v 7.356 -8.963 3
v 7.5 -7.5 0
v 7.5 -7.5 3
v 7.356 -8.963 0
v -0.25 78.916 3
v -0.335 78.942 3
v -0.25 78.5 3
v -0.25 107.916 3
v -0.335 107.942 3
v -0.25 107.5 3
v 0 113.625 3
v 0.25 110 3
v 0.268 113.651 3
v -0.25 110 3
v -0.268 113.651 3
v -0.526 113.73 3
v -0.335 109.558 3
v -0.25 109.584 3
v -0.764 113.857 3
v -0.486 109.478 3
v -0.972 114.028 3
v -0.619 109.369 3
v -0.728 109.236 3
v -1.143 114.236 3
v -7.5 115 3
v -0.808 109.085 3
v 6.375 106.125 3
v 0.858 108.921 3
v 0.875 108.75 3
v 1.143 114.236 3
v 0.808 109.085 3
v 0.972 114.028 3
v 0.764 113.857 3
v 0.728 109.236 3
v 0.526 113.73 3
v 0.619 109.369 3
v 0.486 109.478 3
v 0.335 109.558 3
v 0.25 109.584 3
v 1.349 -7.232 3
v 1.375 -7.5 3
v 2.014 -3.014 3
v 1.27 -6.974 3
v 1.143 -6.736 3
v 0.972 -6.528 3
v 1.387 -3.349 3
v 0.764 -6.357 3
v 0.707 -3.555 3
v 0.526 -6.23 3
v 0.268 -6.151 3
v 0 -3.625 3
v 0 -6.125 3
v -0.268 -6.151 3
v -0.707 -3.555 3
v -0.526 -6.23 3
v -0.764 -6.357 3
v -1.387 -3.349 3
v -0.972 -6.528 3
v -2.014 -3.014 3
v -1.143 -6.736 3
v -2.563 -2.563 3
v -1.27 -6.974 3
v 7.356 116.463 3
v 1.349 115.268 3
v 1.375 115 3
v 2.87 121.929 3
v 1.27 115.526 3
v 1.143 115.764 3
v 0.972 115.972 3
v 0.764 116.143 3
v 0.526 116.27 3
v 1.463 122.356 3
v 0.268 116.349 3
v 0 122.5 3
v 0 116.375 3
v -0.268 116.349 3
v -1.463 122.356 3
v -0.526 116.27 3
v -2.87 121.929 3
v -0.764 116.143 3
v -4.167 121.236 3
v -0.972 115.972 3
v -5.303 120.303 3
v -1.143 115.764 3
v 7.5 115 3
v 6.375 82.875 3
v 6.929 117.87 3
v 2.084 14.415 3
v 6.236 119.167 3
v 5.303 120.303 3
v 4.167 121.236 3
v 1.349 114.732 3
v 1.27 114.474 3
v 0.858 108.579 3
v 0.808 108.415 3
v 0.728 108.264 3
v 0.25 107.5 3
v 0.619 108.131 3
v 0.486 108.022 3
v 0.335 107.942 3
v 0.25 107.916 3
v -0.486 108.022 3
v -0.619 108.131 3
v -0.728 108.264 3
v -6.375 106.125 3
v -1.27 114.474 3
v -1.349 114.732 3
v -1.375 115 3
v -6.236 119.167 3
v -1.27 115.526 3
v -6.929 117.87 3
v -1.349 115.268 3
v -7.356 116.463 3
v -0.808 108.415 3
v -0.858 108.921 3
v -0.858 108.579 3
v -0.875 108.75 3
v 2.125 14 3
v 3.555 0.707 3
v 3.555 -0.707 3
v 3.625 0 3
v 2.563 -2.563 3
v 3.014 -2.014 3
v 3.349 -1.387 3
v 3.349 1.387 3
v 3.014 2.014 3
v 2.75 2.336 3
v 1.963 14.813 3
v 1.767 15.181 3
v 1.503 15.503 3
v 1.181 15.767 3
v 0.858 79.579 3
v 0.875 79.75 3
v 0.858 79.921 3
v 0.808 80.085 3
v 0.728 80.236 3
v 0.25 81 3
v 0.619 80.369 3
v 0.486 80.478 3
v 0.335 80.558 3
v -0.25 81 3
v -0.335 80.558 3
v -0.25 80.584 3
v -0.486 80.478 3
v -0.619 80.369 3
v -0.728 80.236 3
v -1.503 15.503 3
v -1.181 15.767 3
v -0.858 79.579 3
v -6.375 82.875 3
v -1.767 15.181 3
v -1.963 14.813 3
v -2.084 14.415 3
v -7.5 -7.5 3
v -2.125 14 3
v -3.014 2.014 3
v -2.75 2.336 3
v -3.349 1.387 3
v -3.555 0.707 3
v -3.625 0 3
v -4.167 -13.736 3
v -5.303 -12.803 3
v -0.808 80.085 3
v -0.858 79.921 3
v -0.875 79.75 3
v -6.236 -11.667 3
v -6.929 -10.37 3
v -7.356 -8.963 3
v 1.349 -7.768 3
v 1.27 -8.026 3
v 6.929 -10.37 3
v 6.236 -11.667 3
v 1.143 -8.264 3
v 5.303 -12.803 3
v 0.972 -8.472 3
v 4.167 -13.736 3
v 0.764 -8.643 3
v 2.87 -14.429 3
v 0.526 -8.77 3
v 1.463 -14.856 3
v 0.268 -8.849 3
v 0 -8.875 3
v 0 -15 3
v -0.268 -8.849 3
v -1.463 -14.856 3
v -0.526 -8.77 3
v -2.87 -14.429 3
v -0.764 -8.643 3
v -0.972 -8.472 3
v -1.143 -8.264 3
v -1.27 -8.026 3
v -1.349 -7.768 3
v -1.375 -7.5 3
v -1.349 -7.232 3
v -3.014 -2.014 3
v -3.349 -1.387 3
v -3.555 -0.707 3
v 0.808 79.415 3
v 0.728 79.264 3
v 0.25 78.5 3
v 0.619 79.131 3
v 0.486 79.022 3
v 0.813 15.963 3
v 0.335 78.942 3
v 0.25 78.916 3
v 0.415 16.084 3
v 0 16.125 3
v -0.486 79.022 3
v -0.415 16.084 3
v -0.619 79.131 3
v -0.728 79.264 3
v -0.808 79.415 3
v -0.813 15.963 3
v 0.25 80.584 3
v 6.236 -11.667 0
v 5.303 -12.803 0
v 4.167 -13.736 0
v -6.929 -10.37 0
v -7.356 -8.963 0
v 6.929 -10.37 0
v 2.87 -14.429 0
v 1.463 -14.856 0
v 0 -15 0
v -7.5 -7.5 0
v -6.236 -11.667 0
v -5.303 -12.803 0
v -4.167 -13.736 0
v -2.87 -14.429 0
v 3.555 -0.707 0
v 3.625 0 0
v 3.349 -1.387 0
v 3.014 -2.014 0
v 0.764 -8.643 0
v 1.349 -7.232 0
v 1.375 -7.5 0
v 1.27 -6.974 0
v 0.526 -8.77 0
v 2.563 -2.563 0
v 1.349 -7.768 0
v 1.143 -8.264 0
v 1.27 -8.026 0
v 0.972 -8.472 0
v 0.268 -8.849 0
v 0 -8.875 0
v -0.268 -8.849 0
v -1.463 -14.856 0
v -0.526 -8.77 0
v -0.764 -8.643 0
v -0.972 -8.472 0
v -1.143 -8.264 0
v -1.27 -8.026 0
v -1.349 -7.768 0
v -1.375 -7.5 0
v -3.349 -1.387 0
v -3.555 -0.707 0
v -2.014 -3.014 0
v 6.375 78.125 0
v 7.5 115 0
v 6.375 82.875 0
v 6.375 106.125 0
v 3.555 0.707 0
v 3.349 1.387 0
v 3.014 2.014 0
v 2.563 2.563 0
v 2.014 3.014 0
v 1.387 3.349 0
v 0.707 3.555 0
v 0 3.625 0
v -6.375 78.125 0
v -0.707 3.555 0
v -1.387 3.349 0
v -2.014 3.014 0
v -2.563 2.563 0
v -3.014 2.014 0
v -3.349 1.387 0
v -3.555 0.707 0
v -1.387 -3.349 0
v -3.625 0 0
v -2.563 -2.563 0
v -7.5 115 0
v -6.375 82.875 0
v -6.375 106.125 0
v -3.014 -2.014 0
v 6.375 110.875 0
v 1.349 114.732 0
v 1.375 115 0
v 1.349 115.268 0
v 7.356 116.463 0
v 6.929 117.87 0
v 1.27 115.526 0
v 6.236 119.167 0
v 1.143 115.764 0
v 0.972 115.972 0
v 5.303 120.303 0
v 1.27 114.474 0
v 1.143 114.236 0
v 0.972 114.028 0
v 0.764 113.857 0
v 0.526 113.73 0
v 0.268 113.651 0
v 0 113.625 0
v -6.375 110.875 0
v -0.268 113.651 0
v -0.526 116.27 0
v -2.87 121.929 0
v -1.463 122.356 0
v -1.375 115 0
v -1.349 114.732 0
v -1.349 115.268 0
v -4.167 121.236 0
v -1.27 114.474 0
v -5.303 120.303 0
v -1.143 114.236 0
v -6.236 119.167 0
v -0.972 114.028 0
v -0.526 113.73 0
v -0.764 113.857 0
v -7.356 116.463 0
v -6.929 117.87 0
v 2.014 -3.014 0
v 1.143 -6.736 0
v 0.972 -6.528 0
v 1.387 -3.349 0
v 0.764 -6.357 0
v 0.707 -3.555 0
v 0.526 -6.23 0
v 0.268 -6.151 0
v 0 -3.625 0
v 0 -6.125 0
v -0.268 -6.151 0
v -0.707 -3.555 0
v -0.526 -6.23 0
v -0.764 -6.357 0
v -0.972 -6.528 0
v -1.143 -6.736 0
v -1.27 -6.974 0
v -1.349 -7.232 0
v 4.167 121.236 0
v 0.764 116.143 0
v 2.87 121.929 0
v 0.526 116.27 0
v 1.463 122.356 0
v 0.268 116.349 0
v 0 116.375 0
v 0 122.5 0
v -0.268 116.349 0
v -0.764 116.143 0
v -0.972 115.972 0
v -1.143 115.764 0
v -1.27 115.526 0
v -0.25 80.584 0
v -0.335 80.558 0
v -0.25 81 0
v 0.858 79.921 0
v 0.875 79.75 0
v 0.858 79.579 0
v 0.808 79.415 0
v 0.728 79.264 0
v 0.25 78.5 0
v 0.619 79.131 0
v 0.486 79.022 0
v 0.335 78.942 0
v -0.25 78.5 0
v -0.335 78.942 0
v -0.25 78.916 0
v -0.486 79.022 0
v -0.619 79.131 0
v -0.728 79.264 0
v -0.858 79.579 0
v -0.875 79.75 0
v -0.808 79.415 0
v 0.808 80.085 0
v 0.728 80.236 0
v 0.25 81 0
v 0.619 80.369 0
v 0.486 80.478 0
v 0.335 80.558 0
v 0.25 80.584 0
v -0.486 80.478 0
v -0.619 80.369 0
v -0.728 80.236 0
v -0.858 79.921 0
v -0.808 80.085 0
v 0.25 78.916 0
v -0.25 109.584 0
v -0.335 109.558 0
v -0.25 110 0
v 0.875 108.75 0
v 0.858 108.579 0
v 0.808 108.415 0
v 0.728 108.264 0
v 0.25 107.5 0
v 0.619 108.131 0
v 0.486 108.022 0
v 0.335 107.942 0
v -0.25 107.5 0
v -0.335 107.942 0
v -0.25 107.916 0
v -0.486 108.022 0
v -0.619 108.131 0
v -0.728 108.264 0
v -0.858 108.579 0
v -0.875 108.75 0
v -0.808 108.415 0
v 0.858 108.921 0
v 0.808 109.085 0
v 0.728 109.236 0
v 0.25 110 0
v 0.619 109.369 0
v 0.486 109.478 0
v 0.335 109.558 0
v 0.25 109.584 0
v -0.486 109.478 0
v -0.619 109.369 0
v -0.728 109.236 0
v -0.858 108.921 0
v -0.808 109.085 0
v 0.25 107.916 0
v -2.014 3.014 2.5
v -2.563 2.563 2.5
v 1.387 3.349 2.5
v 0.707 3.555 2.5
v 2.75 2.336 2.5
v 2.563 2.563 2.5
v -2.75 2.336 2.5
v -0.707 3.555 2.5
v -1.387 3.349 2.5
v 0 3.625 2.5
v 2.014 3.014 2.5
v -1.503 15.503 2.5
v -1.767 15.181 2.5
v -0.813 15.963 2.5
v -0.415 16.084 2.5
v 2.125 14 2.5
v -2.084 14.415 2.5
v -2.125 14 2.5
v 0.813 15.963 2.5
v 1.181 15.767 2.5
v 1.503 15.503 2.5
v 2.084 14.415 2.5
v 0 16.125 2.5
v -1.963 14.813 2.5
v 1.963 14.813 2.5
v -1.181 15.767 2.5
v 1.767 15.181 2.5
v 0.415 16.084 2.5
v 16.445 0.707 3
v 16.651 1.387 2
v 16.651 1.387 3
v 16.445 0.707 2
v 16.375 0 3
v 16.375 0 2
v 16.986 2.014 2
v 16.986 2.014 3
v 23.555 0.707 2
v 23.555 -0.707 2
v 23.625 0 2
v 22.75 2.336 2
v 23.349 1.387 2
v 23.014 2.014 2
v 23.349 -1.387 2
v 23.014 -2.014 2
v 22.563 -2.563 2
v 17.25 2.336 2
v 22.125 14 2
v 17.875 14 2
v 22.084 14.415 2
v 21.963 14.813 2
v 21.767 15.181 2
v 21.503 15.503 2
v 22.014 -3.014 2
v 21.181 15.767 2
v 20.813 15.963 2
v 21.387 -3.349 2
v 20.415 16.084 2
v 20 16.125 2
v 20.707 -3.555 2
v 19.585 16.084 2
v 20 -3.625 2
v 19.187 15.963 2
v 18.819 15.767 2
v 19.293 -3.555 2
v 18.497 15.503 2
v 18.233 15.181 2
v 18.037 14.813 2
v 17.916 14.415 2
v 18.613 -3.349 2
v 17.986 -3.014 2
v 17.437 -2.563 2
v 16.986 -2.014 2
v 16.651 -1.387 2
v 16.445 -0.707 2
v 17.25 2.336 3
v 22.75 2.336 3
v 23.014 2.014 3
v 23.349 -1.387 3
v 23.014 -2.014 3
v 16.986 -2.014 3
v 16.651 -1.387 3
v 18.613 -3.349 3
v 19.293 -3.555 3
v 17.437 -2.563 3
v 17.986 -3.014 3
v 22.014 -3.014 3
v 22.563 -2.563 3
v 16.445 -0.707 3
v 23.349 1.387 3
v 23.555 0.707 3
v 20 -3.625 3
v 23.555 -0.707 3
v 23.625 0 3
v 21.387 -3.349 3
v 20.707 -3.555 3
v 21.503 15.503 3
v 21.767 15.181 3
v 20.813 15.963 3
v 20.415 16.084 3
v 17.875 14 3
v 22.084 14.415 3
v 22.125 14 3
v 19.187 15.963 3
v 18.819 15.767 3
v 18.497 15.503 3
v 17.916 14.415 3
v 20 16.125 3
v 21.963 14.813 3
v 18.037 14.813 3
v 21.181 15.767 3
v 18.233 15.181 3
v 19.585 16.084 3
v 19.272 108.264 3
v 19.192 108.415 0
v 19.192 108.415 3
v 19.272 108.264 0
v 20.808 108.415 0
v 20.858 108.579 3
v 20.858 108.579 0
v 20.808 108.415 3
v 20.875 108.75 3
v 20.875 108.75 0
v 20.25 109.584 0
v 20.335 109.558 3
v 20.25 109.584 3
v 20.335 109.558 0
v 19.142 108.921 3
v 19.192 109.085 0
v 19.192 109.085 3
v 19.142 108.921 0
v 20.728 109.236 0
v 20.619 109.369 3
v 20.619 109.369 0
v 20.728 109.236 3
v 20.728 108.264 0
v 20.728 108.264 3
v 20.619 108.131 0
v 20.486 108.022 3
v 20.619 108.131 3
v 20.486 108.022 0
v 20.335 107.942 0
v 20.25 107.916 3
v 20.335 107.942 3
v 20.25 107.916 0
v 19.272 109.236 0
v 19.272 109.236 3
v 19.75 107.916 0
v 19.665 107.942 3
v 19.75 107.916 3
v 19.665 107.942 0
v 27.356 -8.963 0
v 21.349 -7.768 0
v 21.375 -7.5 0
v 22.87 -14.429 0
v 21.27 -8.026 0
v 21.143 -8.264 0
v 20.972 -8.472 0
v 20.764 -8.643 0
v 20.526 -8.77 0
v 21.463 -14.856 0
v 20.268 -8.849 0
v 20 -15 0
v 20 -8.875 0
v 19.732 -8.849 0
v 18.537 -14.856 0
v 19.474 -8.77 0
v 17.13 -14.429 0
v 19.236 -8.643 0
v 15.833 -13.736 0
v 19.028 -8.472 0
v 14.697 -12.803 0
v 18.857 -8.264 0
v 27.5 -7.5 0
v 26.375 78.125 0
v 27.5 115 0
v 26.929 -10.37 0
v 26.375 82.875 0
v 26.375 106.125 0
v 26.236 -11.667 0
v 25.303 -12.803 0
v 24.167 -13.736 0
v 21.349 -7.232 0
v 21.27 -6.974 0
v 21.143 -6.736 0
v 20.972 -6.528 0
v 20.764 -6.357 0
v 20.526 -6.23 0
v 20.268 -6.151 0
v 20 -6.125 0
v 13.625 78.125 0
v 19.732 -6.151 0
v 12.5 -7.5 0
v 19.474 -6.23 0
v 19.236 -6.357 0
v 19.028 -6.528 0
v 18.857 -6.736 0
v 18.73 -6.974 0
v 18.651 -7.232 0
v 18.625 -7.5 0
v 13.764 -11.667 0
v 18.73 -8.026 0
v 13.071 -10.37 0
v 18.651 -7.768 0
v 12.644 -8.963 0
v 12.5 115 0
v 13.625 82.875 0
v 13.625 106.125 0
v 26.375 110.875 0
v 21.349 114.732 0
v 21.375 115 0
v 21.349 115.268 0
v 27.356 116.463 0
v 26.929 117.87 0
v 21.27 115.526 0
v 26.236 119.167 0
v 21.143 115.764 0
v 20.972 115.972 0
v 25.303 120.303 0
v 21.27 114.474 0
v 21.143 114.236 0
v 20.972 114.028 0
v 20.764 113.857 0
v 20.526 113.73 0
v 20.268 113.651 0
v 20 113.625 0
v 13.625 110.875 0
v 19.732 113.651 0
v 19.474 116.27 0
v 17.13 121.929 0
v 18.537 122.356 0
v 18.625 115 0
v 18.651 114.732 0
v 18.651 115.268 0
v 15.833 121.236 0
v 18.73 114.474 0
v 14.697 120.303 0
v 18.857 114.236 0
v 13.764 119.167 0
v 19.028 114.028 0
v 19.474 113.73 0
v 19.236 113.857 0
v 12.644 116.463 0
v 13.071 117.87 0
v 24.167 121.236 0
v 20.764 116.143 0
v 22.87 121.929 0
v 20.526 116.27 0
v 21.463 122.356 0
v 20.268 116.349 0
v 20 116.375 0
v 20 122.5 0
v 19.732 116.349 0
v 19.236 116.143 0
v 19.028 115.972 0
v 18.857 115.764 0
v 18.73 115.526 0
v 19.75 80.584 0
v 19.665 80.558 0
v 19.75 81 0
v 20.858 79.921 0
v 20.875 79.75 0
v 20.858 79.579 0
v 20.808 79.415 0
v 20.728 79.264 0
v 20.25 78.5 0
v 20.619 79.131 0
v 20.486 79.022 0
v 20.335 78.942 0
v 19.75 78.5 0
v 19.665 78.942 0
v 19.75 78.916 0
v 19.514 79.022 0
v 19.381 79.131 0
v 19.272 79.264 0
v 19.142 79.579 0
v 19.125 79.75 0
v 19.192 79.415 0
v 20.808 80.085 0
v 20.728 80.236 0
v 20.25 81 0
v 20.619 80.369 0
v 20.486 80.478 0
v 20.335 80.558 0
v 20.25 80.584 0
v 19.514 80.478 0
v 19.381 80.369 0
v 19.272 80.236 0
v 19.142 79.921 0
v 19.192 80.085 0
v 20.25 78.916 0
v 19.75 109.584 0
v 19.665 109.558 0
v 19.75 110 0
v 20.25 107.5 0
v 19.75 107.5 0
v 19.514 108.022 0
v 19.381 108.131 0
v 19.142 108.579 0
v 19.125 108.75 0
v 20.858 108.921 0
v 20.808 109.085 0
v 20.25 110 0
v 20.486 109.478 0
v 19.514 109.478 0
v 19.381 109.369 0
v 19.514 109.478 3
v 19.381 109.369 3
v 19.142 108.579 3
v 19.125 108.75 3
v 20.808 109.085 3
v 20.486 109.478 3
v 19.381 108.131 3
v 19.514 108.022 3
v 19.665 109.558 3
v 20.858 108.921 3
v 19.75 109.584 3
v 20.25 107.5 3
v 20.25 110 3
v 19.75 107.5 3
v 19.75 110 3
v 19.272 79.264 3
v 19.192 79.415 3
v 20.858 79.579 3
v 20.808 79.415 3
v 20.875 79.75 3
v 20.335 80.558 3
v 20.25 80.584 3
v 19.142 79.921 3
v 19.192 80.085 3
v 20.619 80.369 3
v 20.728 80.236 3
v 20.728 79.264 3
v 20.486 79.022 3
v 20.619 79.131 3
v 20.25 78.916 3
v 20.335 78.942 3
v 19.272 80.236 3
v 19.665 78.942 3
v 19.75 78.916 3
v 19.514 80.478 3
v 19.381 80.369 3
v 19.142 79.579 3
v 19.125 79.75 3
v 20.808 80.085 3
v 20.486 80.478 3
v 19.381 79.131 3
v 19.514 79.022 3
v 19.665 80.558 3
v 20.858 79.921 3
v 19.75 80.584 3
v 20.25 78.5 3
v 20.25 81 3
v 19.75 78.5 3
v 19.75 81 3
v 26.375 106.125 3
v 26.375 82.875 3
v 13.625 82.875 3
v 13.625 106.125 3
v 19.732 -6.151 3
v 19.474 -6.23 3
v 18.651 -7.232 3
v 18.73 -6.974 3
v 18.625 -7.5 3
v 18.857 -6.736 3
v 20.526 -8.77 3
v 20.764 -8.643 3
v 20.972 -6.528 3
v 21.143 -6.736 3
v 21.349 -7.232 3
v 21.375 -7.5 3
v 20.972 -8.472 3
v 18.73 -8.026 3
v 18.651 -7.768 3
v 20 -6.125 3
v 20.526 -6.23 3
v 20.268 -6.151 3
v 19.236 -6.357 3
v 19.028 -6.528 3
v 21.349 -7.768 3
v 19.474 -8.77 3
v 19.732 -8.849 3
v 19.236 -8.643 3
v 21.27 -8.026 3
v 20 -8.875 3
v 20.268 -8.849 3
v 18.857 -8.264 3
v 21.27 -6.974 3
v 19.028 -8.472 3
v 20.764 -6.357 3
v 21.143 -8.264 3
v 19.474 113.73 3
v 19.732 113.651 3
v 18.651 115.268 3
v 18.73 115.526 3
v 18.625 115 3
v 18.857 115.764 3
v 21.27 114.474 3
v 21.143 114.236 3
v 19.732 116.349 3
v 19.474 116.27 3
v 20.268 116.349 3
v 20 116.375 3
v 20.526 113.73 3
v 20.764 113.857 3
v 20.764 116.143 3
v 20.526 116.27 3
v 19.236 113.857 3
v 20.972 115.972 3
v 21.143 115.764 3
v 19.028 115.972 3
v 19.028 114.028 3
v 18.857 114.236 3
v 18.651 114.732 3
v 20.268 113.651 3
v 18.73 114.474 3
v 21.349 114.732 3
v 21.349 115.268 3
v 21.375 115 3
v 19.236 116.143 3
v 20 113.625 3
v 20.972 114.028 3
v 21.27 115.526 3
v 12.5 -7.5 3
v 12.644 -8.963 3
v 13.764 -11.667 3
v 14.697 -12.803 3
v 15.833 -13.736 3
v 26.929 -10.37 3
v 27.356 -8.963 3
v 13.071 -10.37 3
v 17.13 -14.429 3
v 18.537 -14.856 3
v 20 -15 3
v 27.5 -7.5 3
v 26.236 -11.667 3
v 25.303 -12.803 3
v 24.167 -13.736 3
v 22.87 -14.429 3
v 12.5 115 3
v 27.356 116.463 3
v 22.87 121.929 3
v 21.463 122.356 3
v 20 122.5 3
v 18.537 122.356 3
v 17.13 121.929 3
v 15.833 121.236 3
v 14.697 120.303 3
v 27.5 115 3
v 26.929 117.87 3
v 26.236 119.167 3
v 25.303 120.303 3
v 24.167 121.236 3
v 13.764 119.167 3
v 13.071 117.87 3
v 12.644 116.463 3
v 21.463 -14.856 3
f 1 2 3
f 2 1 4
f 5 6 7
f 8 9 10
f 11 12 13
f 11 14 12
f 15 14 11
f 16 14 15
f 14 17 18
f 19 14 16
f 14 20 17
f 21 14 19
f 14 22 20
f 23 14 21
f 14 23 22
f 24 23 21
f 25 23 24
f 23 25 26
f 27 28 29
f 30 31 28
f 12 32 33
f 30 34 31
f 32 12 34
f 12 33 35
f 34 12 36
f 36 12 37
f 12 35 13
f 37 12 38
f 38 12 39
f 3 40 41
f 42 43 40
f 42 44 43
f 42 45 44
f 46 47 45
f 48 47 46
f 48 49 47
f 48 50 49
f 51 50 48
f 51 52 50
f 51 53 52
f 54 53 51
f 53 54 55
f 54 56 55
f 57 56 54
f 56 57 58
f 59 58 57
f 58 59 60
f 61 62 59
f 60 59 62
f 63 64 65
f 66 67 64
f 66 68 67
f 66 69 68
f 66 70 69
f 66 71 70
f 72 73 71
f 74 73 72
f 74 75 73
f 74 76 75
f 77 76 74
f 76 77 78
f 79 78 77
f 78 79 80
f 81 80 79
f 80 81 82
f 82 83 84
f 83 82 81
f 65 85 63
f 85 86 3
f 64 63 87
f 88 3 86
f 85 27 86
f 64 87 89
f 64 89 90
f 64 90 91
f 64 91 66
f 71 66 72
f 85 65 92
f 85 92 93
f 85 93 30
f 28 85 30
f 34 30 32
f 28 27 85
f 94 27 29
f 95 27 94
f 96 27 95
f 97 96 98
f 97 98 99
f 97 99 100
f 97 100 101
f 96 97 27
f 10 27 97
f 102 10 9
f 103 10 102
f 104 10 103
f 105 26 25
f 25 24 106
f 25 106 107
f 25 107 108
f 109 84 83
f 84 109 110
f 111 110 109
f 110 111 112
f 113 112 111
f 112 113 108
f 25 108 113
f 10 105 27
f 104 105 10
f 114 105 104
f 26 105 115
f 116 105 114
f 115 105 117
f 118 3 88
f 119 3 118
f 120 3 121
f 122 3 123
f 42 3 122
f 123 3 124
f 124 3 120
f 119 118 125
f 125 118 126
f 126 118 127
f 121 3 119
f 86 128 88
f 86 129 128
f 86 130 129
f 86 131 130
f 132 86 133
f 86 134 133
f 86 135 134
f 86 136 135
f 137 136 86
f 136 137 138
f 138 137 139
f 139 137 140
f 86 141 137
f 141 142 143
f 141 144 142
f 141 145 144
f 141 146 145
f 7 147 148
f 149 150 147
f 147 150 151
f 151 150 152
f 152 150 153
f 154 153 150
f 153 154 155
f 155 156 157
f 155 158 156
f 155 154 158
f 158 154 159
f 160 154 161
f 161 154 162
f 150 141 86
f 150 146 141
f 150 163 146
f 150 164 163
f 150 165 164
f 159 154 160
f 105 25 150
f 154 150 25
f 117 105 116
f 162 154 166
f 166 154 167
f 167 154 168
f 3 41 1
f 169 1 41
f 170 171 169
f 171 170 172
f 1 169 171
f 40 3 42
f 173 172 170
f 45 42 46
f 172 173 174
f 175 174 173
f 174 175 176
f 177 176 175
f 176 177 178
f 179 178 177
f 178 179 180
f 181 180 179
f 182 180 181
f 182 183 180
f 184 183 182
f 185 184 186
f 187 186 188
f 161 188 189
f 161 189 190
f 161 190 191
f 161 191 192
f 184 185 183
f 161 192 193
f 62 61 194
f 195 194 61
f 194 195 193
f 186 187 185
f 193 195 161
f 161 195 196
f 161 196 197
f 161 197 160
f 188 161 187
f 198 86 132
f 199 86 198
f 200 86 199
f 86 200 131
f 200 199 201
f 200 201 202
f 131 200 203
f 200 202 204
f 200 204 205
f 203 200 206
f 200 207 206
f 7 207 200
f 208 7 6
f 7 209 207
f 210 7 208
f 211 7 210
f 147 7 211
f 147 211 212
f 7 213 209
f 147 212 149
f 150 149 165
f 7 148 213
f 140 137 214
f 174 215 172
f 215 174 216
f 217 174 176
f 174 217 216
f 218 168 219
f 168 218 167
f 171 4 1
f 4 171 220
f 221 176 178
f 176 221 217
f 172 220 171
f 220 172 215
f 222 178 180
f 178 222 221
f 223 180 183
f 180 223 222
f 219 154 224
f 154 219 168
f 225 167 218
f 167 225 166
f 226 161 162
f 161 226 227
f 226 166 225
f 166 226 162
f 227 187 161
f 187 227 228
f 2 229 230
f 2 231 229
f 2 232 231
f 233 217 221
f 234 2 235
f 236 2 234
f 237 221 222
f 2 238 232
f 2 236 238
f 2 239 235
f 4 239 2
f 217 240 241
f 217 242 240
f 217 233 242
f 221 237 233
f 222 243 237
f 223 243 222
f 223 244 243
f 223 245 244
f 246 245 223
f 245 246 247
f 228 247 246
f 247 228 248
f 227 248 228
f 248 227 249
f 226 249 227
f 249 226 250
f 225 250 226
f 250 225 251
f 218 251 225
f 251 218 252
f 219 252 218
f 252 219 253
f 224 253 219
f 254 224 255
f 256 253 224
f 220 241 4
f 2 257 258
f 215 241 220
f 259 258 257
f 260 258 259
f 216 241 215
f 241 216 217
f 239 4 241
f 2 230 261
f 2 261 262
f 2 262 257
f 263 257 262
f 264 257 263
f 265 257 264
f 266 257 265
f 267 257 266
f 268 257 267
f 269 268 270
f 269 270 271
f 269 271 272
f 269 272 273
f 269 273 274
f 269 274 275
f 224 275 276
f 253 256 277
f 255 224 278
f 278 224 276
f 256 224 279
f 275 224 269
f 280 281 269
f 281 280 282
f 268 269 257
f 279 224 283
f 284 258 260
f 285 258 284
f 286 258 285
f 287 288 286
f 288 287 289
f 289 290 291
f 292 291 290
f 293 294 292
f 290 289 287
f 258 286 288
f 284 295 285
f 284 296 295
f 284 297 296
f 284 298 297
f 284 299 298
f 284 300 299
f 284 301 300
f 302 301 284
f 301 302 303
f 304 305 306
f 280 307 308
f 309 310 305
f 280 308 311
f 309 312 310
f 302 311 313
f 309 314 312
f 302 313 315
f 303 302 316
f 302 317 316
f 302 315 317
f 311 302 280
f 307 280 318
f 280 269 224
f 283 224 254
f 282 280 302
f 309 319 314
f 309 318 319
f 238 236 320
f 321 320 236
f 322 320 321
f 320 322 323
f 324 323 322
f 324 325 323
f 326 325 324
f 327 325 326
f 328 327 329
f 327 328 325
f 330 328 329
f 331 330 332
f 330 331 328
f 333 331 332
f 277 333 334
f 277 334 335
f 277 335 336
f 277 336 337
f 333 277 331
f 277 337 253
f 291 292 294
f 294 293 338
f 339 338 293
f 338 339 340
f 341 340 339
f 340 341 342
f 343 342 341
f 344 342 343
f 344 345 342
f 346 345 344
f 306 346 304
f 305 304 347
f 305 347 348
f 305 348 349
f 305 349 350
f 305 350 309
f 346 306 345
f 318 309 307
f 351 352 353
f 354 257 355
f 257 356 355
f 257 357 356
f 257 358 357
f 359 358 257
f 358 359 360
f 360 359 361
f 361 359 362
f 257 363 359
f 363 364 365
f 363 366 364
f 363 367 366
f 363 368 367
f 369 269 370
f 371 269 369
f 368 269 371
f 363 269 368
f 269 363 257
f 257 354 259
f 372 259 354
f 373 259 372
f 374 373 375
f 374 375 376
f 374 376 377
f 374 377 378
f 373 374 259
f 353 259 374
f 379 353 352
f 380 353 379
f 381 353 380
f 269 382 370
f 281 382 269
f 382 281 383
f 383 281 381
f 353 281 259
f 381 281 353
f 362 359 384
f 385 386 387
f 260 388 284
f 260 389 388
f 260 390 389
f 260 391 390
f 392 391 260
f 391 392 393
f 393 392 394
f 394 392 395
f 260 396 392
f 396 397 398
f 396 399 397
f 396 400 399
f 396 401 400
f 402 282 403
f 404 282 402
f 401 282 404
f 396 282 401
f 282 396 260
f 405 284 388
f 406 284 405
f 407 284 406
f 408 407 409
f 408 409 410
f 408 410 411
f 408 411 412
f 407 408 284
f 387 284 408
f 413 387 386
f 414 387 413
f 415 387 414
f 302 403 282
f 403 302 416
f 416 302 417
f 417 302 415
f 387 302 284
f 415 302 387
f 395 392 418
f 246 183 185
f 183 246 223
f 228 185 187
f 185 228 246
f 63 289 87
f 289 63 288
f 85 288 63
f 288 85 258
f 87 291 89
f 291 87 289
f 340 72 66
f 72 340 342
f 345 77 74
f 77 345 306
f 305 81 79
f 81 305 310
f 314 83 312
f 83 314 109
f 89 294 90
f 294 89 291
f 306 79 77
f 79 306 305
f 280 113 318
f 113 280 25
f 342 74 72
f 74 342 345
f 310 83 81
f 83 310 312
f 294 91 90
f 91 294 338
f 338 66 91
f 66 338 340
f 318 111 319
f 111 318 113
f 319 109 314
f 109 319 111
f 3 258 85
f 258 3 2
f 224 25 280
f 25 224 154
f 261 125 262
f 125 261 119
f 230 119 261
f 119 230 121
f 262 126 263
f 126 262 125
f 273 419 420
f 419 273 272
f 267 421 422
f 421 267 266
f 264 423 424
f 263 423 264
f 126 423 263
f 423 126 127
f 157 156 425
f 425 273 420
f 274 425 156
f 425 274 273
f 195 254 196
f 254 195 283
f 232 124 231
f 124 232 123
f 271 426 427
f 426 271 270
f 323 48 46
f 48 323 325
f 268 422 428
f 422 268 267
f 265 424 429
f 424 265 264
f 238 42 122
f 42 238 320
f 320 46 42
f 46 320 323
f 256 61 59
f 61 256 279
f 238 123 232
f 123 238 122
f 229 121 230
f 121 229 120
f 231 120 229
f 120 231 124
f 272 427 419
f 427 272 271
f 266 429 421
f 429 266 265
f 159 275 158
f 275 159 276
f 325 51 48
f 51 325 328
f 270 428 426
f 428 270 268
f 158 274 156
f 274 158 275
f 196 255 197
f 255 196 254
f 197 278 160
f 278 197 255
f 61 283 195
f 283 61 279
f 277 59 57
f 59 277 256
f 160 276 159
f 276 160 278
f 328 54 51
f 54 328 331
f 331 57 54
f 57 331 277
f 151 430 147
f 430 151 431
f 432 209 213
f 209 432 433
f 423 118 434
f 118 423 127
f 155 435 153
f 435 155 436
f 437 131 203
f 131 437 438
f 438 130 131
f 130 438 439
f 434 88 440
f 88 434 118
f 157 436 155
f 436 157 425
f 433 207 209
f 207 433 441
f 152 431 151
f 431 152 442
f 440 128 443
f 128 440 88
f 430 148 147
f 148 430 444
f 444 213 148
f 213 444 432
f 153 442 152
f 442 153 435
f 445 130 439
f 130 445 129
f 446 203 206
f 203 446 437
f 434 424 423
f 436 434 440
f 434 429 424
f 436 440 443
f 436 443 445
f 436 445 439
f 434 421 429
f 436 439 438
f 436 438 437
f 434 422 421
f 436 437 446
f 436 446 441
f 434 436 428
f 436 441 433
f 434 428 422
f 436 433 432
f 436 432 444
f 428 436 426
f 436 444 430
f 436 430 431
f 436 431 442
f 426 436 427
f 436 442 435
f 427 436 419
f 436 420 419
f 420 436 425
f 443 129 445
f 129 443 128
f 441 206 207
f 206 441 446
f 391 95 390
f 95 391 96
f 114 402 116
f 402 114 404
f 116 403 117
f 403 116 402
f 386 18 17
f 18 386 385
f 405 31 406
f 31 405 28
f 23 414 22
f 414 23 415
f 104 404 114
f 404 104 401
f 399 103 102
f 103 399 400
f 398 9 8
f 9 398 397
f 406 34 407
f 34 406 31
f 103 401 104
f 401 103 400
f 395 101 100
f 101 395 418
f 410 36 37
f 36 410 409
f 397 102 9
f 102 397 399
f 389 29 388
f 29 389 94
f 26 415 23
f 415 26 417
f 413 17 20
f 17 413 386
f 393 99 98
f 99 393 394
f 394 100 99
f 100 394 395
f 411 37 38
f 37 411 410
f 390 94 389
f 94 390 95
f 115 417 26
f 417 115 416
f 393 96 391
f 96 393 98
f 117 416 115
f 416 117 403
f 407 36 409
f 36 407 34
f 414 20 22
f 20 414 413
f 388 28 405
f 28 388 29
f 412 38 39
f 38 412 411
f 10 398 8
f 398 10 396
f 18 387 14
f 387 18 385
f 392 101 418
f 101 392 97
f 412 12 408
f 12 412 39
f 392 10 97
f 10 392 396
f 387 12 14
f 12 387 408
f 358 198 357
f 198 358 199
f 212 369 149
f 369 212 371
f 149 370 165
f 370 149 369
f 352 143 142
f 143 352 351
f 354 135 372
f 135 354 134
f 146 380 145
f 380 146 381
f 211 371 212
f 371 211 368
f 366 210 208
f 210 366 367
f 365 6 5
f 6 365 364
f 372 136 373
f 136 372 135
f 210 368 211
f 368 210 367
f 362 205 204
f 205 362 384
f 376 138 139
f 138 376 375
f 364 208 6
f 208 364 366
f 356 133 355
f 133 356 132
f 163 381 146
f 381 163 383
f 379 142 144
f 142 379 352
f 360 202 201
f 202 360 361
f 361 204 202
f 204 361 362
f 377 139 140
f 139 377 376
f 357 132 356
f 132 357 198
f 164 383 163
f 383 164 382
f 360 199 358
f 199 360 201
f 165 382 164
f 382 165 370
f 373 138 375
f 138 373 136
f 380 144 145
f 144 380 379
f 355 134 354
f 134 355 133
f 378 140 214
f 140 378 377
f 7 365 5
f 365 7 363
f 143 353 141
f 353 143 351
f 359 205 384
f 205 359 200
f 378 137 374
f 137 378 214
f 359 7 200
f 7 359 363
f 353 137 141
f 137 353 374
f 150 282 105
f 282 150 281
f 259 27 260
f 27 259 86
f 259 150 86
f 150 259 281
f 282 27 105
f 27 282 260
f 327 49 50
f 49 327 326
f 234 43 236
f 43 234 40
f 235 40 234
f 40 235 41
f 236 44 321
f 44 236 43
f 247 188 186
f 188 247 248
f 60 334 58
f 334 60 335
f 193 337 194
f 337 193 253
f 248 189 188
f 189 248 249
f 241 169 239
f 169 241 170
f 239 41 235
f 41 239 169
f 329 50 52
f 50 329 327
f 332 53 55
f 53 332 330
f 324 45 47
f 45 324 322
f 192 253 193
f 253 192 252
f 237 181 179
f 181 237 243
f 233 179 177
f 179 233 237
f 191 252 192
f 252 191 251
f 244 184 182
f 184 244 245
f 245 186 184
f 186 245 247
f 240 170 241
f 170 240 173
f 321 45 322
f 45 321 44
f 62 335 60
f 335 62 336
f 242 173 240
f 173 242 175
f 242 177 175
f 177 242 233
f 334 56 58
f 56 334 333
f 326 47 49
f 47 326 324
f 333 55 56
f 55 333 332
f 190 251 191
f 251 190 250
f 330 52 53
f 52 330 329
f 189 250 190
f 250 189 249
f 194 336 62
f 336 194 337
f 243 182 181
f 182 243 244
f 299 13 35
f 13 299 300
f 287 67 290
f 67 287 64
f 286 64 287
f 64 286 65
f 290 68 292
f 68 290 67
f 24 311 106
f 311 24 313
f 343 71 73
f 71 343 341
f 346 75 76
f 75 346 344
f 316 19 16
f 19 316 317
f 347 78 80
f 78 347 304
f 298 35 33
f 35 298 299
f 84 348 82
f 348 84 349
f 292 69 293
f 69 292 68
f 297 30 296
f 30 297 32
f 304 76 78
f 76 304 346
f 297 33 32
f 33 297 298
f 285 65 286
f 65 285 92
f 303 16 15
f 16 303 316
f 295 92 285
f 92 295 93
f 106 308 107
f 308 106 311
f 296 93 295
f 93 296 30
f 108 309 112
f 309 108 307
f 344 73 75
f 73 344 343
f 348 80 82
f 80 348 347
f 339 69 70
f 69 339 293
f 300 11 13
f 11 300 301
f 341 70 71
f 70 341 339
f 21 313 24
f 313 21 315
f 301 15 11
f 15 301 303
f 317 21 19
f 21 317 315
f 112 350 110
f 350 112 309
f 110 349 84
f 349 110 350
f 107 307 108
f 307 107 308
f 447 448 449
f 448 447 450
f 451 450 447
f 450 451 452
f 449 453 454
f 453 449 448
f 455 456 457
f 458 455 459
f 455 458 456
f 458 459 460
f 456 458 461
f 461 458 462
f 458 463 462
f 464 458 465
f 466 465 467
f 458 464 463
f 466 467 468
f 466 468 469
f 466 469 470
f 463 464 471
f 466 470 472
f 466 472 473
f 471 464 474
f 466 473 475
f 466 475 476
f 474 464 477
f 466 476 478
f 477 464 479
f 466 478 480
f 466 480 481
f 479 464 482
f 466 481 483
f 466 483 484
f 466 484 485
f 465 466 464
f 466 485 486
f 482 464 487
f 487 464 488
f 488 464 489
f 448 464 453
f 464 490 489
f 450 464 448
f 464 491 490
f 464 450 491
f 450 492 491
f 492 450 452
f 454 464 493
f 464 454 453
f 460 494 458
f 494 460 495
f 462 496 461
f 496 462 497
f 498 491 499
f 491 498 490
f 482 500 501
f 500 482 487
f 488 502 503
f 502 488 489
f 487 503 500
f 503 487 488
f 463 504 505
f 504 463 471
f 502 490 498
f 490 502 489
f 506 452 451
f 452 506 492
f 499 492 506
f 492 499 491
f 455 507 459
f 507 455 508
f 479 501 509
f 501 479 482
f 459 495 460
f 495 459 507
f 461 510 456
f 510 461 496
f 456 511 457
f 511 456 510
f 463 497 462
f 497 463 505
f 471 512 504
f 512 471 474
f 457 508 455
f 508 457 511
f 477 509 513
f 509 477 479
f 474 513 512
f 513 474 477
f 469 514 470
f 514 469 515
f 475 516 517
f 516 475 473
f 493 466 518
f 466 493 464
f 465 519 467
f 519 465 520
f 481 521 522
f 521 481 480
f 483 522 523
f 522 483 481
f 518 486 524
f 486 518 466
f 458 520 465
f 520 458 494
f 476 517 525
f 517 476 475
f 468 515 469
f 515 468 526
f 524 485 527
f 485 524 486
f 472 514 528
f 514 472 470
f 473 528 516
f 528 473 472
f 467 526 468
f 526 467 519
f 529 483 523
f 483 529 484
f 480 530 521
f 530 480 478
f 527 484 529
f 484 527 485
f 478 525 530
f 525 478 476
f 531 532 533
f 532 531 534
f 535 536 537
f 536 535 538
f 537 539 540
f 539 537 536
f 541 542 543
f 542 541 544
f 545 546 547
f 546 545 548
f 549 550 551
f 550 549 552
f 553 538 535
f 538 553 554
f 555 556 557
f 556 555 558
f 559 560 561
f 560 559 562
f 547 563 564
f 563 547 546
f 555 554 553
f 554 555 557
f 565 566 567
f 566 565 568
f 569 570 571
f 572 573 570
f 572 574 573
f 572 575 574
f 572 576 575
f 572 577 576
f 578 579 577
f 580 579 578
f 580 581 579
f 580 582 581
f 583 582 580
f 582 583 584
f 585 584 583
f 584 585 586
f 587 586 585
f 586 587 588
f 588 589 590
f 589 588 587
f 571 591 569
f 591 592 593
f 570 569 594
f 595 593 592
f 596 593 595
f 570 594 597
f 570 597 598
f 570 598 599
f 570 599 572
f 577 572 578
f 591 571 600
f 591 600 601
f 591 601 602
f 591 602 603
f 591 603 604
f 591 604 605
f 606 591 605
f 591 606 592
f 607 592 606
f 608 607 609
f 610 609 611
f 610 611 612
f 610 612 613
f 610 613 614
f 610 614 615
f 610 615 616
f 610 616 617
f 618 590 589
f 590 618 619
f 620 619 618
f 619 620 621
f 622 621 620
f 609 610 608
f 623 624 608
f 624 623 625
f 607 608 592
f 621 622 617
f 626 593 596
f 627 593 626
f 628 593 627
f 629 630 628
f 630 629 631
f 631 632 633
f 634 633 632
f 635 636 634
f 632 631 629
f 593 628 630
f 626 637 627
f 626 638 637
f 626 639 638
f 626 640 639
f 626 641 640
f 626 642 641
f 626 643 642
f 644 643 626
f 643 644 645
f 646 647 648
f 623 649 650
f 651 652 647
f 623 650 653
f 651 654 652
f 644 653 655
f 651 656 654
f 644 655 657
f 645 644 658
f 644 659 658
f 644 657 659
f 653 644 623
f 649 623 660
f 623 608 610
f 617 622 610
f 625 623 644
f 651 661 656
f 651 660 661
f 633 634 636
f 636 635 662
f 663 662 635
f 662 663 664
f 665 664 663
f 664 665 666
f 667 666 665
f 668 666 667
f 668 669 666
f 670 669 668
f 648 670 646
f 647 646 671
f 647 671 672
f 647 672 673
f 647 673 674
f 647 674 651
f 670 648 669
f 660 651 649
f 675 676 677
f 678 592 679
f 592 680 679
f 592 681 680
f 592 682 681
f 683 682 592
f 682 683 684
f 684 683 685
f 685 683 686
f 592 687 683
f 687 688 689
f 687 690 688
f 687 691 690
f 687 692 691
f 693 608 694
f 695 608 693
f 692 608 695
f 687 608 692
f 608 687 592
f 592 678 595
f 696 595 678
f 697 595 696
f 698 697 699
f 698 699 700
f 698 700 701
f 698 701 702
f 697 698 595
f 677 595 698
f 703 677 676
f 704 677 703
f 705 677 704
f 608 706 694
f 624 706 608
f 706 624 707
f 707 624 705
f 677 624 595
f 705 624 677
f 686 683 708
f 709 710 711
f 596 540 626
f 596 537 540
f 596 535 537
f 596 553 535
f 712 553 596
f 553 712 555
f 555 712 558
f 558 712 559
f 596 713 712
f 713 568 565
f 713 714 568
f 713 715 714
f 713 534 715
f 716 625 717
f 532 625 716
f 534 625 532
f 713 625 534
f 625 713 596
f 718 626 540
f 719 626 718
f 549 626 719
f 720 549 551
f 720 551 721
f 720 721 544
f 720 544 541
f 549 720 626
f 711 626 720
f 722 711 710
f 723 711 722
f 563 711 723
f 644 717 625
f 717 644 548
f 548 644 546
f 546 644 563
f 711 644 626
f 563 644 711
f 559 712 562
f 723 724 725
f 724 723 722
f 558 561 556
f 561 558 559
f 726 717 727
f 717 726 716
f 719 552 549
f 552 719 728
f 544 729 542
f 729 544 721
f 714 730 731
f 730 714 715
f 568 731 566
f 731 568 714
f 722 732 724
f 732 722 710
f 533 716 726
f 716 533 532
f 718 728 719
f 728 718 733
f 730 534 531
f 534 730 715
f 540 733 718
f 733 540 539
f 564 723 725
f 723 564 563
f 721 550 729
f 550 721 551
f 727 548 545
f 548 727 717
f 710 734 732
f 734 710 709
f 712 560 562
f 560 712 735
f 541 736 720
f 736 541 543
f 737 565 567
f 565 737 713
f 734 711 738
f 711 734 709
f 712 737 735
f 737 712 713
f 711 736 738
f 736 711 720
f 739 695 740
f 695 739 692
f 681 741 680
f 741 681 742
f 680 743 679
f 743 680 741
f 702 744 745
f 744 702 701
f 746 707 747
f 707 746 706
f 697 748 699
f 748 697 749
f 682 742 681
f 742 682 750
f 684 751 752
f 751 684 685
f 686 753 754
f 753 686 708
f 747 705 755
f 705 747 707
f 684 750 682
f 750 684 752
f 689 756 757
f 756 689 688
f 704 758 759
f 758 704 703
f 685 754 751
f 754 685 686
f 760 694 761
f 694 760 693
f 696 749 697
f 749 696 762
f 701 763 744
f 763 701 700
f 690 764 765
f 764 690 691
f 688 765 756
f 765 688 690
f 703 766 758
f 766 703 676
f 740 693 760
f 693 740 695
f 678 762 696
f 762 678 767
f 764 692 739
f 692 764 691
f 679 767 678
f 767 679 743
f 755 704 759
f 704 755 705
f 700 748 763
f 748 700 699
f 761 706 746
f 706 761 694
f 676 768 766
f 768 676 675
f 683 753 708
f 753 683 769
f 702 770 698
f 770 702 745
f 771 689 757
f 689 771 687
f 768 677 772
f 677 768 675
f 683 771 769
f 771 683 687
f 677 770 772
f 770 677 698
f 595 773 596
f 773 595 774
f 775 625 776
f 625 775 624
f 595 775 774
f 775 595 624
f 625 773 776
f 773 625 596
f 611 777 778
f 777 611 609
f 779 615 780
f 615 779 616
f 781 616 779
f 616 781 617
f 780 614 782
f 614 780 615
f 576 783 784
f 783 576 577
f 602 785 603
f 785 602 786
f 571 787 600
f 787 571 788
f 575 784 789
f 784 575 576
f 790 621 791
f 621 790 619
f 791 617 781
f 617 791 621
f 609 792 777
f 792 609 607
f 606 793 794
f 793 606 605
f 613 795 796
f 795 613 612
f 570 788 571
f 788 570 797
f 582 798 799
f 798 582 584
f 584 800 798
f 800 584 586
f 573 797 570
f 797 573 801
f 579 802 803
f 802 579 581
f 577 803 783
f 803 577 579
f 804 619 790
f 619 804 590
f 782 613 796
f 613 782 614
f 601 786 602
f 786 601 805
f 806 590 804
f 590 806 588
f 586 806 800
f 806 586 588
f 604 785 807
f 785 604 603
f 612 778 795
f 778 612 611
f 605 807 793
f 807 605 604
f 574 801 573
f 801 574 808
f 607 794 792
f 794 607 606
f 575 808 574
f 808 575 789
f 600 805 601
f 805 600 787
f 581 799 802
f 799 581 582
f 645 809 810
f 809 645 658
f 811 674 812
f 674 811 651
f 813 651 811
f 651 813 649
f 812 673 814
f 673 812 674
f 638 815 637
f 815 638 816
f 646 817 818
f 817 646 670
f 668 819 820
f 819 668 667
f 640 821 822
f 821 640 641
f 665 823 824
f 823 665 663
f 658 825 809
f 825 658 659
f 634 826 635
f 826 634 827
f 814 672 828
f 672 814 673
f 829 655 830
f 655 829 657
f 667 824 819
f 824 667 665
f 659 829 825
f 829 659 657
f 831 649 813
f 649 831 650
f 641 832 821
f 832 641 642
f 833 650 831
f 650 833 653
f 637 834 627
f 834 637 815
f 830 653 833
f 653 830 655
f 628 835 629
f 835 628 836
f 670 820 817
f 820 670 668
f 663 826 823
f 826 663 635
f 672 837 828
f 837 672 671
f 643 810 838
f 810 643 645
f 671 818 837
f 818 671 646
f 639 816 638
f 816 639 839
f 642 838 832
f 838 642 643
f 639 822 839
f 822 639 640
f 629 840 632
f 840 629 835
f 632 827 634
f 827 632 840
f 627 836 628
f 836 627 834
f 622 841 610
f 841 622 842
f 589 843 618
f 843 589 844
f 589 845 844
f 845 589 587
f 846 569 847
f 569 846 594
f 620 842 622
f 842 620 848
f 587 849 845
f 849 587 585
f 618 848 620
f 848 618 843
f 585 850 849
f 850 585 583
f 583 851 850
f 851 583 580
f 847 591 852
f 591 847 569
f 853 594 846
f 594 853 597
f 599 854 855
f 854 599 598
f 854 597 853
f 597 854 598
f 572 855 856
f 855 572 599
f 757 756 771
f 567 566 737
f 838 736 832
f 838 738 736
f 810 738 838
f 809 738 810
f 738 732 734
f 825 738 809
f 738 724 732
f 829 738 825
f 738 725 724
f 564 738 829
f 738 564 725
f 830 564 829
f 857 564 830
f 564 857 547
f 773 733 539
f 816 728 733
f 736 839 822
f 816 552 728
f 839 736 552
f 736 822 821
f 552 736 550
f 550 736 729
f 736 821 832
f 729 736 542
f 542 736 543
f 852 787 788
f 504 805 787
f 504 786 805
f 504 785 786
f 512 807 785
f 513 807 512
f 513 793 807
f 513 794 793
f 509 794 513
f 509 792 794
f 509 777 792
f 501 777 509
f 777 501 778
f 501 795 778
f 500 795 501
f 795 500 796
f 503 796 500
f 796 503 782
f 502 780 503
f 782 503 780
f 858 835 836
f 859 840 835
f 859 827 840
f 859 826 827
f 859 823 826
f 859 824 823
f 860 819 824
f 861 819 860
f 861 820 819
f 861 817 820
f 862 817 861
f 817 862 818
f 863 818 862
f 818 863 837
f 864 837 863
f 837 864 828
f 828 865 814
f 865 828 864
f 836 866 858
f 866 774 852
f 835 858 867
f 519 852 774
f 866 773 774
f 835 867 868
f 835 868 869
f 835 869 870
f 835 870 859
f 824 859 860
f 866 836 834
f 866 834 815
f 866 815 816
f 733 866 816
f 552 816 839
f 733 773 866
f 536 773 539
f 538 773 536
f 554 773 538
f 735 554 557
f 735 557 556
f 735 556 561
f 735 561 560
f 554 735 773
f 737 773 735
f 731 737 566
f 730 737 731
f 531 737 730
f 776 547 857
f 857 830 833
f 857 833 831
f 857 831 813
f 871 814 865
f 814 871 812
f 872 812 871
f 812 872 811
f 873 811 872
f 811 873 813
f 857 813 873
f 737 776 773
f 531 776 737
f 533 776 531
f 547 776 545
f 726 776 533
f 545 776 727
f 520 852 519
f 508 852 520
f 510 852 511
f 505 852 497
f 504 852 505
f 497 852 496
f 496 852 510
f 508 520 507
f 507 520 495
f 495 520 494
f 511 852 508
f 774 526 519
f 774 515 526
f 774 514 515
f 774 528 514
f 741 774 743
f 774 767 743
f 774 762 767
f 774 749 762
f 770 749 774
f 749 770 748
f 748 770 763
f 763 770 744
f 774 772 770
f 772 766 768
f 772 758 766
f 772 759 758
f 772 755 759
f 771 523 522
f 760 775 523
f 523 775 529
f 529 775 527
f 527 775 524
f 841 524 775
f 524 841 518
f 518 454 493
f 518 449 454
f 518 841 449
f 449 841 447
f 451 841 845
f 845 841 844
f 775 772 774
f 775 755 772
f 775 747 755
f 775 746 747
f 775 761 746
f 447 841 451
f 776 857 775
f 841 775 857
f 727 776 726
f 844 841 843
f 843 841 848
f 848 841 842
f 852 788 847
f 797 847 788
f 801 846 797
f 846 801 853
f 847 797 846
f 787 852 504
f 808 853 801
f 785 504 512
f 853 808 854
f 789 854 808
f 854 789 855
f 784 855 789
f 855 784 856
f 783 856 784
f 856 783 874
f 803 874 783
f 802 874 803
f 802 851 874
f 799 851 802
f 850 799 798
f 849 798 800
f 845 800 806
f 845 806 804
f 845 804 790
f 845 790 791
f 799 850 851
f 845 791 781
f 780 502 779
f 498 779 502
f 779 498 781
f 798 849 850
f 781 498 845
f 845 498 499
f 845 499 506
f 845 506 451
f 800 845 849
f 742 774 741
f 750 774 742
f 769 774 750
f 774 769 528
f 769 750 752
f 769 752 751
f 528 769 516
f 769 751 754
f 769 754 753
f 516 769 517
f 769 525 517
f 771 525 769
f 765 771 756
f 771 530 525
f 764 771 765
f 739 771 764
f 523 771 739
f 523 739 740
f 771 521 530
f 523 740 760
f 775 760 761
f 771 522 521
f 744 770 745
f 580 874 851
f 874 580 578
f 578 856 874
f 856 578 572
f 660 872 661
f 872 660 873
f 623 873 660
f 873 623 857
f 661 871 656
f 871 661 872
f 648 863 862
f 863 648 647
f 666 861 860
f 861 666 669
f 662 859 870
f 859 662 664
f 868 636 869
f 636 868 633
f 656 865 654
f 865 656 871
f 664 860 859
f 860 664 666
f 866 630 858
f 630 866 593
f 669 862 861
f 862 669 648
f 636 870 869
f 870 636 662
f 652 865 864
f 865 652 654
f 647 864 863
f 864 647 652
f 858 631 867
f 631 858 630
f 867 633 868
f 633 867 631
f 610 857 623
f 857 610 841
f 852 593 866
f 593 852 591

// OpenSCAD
// file: SG-90.scad
$fn = 32;

// the motor will be this much wider horizontally, so that holes made by difference with it will have tolerance.
// this will also be added to the radius of the horns circles.
toleranceGap = 0.25; 

module sg90()
{
    union()
    {
         // Body
        translate([0, 5.5, -6.5])
        cube([12.5 + toleranceGap, 23 + toleranceGap, 24], true);
        // Collar
        translate([0, 5.5, 2.5/2])
        cube([12.5 + toleranceGap, 32.5 + toleranceGap, 2.5], true);
        // Raise
        translate([0, 0, 24-18.5])
        cylinder(h=4.5, d=11.5);
        
        // Screw holes

        translate([0, -11.5/2-3, -4.5])
        union()
        {
            cylinder(h=4.5, d=1.75);
            translate([0, 0, 2.25])
            cube([0.5, 2.5, 4.5], true);
        }
        translate([0, -11.5/2+26, -4.5])
        union()
        {
            cylinder(h=4.5, d=1.75);
            translate([0, 0, 2.25])
            cube([0.5, 2.5, 4.5], true);
        }
    }
}

module horn()
{
    // Bottom part
    translate([0, 0, -2.5])
    cylinder(h=4, d=7+toleranceGap);
    // Horn part
    hull()
    {
        translate([0, 14, 0])
        cylinder(h=1.5, d=4+toleranceGap);
        cylinder(h=1.5, d=5.5+toleranceGap);
    }
}

difference()
{
    cube([15, 65, 4]);
    translate([15/2, 15, 4])
    #sg90();
    translate([15/2, 45, 2.5])
    #horn();
}
// main file
use <SG-90.scad>
$fn = 32;

armLength = 100;

module cutOuts()
{
    union()
    {
        translate([0, 0, 2.5])
        horn();
        translate([0, armLength, 6])
        rotate([0, 0, 180])
        sg90();
        //another motor to make sure both sides have screw holes.
        translate([0, armLength, 0])
        rotate([0, 180, 180])
        sg90();
        
        //screws
        translate([0, -7.5, 0])
        cylinder(h=6, d=2.75);
        translate([0, armLength+15, 0])
        cylinder(h=6, d=2.75);
    }
}

//bottom
difference()
{
    union() {
        translate([0, -7.5, 0])
        cylinder(h=3, d=15);
        translate([0, armLength+15, 0])
        cylinder(h=3, d=15);
        translate([-7.5, -7.5, 0])
        cube([15, armLength + 15 + 7.5, 3]);
    }
    cutOuts();
}

//top
translate([20, 0, +6]) // move to side for printing
rotate([0, 180, 0])
difference()
{
    translate([0, 0, 3])
    union() {
        translate([0, -7.5, 0])
        cylinder(h=3, d=15);
        translate([0, armLength+15, 0])
        cylinder(h=3, d=15);
        translate([-7.5, -7.5, 0])
        cube([15, armLength + 15 + 7.5, 3]);
    }
    cutOuts();
}
